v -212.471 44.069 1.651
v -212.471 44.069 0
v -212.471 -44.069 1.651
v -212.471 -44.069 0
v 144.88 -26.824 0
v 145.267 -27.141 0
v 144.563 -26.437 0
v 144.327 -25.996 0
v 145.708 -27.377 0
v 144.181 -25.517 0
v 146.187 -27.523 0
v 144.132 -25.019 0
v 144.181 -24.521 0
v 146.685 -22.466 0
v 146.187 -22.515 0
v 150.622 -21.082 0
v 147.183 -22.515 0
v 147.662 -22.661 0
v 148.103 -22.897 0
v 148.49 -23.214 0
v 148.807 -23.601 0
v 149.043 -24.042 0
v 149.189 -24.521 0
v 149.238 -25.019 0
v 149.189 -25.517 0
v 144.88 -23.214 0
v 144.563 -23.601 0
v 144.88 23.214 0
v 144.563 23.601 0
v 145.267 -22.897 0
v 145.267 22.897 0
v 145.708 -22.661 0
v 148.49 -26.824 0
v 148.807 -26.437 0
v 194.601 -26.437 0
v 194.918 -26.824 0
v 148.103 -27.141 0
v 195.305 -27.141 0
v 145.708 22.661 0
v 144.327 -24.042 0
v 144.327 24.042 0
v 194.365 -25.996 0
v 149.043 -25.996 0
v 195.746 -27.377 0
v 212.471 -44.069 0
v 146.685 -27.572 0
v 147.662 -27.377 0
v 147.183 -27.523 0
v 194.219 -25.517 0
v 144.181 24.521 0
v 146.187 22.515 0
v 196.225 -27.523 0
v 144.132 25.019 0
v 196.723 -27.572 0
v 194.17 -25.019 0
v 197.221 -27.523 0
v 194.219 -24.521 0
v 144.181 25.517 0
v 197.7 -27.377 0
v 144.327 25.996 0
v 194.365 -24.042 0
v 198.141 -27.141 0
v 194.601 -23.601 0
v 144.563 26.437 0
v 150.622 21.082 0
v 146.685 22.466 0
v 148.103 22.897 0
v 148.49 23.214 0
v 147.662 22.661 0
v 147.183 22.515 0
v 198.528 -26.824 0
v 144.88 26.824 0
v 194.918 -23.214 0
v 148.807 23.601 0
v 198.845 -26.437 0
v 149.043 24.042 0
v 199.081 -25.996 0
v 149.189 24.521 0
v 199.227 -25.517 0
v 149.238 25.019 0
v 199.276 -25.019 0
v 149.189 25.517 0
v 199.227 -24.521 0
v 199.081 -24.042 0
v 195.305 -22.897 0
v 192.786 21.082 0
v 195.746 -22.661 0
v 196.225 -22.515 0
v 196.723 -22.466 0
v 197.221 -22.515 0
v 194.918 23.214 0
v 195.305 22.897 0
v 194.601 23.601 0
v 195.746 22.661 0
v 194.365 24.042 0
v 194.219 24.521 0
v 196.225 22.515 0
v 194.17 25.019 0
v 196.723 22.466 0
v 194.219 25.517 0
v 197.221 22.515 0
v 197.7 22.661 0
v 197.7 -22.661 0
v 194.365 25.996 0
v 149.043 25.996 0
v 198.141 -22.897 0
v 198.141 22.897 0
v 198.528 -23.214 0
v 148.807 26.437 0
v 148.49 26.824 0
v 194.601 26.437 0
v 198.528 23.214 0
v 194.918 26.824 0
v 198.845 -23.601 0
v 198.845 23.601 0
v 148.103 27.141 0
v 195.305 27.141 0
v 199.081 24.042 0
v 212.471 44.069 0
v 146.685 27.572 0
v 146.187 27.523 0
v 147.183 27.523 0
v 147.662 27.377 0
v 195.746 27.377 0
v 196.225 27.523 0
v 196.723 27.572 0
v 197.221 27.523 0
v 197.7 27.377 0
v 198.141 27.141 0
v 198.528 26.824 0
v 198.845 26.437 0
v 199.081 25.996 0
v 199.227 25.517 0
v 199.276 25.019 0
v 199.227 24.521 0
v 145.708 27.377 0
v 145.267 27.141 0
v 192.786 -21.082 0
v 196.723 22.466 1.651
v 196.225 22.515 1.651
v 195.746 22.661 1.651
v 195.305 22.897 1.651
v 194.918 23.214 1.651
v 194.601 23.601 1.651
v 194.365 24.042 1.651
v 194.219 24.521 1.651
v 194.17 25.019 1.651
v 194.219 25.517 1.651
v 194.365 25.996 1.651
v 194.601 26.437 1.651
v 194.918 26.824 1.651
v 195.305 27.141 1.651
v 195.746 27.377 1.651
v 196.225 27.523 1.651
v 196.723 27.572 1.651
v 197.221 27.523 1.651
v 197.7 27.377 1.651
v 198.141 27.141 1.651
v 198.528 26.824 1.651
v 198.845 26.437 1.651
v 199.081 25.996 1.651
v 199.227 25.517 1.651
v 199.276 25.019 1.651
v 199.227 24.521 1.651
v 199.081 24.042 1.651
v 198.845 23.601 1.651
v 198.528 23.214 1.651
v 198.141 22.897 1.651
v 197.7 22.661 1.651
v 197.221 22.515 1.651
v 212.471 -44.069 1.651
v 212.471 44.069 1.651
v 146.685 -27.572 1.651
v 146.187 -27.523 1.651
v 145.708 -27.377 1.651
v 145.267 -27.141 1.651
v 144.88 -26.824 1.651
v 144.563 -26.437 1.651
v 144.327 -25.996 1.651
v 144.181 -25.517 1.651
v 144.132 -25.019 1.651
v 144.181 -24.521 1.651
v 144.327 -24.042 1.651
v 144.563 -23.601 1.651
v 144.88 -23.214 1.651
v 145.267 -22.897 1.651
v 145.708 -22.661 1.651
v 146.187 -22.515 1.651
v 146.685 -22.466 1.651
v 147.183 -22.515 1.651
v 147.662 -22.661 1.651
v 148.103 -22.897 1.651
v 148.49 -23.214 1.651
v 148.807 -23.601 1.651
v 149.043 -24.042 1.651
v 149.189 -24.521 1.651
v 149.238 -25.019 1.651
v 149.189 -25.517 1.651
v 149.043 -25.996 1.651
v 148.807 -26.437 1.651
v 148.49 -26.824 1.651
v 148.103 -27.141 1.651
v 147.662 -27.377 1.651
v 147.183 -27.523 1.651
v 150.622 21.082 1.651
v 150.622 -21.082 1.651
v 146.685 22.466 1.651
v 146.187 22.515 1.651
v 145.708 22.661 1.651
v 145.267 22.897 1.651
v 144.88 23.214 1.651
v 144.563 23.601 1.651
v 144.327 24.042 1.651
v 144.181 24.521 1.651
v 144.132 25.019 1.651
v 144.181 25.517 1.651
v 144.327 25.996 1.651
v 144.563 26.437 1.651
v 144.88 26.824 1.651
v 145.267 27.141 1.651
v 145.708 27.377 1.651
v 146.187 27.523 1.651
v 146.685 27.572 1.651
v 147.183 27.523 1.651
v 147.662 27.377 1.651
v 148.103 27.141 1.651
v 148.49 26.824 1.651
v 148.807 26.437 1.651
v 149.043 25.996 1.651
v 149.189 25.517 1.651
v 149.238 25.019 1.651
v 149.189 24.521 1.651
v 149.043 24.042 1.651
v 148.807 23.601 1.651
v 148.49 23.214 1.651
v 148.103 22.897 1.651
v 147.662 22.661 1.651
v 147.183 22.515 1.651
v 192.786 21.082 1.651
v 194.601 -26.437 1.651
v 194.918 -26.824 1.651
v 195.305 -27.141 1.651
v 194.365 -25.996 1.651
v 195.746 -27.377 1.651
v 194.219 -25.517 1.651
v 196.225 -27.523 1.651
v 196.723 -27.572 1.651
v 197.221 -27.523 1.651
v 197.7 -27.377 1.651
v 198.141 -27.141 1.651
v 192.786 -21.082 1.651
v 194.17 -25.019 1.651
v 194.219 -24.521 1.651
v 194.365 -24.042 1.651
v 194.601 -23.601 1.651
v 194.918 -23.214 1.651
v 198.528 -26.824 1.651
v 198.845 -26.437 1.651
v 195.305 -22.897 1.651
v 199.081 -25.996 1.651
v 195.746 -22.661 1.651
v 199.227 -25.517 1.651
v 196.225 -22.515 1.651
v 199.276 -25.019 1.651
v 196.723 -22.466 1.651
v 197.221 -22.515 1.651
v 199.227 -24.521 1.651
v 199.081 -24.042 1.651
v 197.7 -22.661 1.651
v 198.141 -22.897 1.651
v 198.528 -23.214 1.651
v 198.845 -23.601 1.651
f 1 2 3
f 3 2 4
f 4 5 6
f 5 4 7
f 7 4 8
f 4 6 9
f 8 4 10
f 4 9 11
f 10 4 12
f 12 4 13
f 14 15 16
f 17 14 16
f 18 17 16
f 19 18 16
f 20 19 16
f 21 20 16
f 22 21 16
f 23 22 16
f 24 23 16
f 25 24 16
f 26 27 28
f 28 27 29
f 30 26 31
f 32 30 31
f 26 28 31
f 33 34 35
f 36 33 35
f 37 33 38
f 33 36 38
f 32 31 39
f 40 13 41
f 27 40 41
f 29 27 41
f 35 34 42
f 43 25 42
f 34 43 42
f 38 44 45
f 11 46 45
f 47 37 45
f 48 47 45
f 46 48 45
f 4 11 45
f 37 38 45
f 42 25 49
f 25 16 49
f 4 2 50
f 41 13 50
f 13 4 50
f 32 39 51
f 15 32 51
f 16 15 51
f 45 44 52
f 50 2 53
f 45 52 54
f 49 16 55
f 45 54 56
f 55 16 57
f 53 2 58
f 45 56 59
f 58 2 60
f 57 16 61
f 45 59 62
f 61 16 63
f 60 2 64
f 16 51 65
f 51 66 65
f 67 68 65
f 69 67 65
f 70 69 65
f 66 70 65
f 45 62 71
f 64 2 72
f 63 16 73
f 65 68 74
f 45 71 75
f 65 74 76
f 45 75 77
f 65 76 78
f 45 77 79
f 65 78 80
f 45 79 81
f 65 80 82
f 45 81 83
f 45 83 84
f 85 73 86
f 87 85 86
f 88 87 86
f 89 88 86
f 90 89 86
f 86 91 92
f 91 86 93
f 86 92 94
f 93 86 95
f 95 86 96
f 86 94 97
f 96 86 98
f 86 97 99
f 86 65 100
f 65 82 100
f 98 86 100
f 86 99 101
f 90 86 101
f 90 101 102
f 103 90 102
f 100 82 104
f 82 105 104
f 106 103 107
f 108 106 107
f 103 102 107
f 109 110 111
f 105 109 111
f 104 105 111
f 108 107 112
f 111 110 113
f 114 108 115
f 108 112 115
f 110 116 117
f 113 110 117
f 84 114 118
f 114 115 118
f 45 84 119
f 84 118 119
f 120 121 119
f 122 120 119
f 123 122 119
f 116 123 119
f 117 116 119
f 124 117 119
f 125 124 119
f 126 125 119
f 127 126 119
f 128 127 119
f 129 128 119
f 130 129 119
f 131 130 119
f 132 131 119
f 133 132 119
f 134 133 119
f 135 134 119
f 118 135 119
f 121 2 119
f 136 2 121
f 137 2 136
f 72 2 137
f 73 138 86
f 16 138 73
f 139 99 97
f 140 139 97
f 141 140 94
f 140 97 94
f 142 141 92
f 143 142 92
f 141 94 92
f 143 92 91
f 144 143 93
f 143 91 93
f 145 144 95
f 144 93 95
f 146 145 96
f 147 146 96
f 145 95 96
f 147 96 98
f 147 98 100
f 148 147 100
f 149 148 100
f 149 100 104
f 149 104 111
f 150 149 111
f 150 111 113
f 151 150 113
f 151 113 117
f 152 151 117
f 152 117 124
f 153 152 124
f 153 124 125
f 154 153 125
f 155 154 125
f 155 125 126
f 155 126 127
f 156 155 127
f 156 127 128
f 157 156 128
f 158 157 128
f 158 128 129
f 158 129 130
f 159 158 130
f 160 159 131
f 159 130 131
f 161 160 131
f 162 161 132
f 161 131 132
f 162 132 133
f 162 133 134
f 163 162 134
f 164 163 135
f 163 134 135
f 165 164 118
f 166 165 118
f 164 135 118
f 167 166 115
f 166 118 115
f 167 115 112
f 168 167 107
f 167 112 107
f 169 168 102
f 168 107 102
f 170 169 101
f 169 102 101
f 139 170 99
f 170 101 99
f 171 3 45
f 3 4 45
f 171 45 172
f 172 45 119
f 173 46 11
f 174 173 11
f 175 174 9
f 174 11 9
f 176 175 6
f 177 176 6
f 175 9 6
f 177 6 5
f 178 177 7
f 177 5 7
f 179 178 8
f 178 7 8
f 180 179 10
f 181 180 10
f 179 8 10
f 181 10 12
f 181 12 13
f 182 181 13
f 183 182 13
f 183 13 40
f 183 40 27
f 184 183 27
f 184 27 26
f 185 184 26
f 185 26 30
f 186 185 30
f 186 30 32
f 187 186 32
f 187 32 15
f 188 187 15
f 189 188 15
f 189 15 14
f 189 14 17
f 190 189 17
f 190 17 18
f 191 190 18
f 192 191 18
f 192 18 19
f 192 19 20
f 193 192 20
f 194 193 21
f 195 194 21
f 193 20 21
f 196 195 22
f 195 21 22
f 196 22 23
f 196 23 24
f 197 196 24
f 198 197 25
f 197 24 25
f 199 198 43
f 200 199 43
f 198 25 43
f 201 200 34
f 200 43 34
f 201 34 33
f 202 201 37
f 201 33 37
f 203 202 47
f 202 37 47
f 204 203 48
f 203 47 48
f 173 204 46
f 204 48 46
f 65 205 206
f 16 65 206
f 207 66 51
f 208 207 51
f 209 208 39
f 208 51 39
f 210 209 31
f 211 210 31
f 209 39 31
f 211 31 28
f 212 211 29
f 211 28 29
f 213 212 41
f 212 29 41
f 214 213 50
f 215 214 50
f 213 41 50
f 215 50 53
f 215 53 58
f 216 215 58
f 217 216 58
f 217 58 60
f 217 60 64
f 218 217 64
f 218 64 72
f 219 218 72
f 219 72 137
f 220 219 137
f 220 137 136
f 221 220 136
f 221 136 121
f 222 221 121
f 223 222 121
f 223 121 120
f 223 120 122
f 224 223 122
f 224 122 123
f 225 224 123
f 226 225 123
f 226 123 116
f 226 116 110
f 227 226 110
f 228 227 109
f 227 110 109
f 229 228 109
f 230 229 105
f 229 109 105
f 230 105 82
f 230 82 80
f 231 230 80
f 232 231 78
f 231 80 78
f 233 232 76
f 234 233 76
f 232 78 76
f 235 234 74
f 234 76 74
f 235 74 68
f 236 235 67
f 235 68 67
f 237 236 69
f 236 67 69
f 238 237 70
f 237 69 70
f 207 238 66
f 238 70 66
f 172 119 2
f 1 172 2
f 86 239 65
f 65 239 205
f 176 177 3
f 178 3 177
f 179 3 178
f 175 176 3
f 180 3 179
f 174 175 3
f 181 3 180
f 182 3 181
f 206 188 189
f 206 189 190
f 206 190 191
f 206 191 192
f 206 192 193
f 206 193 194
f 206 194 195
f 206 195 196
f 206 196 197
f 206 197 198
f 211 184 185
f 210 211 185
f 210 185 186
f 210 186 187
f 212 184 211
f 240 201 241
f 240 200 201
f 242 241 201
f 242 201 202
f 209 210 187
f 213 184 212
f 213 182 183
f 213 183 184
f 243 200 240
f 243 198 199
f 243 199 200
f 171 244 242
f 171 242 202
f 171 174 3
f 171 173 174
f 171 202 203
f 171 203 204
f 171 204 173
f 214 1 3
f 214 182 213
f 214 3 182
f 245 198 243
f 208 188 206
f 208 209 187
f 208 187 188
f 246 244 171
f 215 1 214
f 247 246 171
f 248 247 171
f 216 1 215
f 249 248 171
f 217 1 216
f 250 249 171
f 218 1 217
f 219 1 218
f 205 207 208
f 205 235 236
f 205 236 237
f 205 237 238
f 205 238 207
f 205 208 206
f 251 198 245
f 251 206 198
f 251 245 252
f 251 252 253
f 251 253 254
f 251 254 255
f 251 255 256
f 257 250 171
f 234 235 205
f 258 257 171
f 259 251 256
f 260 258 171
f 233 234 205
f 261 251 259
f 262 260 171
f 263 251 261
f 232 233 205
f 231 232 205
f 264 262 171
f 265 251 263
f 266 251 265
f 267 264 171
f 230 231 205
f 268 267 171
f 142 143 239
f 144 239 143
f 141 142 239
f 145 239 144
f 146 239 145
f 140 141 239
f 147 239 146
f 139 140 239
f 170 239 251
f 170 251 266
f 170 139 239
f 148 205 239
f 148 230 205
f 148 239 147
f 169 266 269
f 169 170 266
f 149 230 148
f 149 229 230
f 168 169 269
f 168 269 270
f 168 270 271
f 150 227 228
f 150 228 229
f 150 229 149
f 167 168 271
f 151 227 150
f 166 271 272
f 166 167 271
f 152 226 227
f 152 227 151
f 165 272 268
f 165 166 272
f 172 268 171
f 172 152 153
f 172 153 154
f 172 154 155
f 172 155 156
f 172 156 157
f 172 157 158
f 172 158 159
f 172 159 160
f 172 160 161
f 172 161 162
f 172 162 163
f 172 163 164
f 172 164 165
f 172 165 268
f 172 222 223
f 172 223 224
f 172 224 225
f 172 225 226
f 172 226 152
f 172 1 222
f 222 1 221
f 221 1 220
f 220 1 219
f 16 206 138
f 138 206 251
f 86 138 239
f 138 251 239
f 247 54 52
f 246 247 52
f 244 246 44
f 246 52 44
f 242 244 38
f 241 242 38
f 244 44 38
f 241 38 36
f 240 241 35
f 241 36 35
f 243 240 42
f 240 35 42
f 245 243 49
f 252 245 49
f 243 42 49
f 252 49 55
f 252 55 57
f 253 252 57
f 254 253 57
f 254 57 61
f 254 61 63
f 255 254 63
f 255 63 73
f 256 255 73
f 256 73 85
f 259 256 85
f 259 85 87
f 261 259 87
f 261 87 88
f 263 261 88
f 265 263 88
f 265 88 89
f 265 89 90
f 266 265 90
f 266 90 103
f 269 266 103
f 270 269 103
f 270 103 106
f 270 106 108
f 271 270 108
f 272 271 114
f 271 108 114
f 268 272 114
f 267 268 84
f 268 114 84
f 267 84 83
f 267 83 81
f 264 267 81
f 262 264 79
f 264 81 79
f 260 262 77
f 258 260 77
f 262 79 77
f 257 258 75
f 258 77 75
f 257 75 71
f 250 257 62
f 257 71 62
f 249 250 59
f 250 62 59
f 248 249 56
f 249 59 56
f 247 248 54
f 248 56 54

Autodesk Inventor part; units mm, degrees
ref_plane "YZ Plane" through (0, 0, 0) normal (1, 0, 0) x (0, 1, 0)
ref_plane "XZ Plane" through (0, 0, 0) normal (0, 1, 0) x (-1, 0, 0)
ref_plane "XY Plane" through (0, 0, 0) normal (0, 0, 1) x (1, 0, 0)
sketch "Sketch1" plane through (0, 0, 0) normal (0, 0, 1) x (1, 0, 0)
  line L0 (-212.471, -44.069) -> (212.471, -44.069)
  line L1 (212.471, -44.069) -> (212.471, 44.069)
  line L2 (212.471, 44.069) -> (-212.471, 44.069)
  line L3 (-212.471, 44.069) -> (-212.471, -44.069)
  line L4 (-212.471, -44.069) -> (212.471, 44.069) construction
  line L5 (212.471, -44.069) -> (-212.471, 44.069) construction
  point P0 (0, 0)
  dimension "d0" = 424.942
  dimension "d1" = 88.138
extrude "Extrusion1" add sketch "Sketch1" along normal blind 1.651
sketch "airflow" plane through (0, 0, 1.651) normal (0, 0, 1) x (1, 0, 0)
  line L0 (146.685, -25.019) -> (196.723, -25.019) construction
  line L1 (196.723, -25.019) -> (196.723, 25.019) construction
  line L2 (196.723, 25.019) -> (146.685, 25.019) construction
  line L3 (146.685, 25.019) -> (146.685, -25.019) construction
  line L4 (146.685, -25.019) -> (196.723, 25.019) construction
  line L5 (196.723, -25.019) -> (146.685, 25.019) construction
  line L6 (-212.471, 44.069) -> (-212.471, -44.069) projected
  line L7 (-212.471, -44.069) -> (212.471, -44.069) projected
  line L8 (-209.423, -35.814) -> (209.423, -35.814) construction
  line L9 (209.423, -35.814) -> (209.423, 35.814) construction
  line L10 (209.423, 35.814) -> (-209.423, 35.814) construction
  line L11 (-209.423, 35.814) -> (-209.423, -35.814) construction
  line L12 (-209.423, -35.814) -> (209.423, 35.814) construction
  line L13 (209.423, -35.814) -> (-209.423, 35.814) construction
  line L14 (150.622, -21.082) -> (192.786, -21.082)
  line L15 (192.786, -21.082) -> (192.786, 21.082)
  line L16 (192.786, 21.082) -> (150.622, 21.082)
  line L17 (150.622, 21.082) -> (150.622, -21.082)
  line L18 (150.622, -21.082) -> (192.786, 21.082) construction
  line L19 (192.786, -21.082) -> (150.622, 21.082) construction
  point P0 (0, 0)
  point P1 (171.704, 0)
  dimension "d4" = 50.038
  dimension "d5" = 50.038
  dimension "d10" = 44.069
  dimension "d11" = 8.255
  dimension "d12" = 3.048
  dimension "d13" = 12.7
  dimension "d14" = 3.937
hole "Hole1" at (196.723, 25.019, 1.651) at (146.685, 25.019, 1.651) at (196.723, -25.019, 1.651) at (146.685, -25.019, 1.651) direction (0, 0, -1) diameter 5.1054 end through all clearance for "Flat Head Machine Screw (82)" size "#10" standard "Ansi Unified Screw Threads"
extrude "Extrusion3" cut sketch "airflow" against normal through all
properties part number "NMT_backpanel"
